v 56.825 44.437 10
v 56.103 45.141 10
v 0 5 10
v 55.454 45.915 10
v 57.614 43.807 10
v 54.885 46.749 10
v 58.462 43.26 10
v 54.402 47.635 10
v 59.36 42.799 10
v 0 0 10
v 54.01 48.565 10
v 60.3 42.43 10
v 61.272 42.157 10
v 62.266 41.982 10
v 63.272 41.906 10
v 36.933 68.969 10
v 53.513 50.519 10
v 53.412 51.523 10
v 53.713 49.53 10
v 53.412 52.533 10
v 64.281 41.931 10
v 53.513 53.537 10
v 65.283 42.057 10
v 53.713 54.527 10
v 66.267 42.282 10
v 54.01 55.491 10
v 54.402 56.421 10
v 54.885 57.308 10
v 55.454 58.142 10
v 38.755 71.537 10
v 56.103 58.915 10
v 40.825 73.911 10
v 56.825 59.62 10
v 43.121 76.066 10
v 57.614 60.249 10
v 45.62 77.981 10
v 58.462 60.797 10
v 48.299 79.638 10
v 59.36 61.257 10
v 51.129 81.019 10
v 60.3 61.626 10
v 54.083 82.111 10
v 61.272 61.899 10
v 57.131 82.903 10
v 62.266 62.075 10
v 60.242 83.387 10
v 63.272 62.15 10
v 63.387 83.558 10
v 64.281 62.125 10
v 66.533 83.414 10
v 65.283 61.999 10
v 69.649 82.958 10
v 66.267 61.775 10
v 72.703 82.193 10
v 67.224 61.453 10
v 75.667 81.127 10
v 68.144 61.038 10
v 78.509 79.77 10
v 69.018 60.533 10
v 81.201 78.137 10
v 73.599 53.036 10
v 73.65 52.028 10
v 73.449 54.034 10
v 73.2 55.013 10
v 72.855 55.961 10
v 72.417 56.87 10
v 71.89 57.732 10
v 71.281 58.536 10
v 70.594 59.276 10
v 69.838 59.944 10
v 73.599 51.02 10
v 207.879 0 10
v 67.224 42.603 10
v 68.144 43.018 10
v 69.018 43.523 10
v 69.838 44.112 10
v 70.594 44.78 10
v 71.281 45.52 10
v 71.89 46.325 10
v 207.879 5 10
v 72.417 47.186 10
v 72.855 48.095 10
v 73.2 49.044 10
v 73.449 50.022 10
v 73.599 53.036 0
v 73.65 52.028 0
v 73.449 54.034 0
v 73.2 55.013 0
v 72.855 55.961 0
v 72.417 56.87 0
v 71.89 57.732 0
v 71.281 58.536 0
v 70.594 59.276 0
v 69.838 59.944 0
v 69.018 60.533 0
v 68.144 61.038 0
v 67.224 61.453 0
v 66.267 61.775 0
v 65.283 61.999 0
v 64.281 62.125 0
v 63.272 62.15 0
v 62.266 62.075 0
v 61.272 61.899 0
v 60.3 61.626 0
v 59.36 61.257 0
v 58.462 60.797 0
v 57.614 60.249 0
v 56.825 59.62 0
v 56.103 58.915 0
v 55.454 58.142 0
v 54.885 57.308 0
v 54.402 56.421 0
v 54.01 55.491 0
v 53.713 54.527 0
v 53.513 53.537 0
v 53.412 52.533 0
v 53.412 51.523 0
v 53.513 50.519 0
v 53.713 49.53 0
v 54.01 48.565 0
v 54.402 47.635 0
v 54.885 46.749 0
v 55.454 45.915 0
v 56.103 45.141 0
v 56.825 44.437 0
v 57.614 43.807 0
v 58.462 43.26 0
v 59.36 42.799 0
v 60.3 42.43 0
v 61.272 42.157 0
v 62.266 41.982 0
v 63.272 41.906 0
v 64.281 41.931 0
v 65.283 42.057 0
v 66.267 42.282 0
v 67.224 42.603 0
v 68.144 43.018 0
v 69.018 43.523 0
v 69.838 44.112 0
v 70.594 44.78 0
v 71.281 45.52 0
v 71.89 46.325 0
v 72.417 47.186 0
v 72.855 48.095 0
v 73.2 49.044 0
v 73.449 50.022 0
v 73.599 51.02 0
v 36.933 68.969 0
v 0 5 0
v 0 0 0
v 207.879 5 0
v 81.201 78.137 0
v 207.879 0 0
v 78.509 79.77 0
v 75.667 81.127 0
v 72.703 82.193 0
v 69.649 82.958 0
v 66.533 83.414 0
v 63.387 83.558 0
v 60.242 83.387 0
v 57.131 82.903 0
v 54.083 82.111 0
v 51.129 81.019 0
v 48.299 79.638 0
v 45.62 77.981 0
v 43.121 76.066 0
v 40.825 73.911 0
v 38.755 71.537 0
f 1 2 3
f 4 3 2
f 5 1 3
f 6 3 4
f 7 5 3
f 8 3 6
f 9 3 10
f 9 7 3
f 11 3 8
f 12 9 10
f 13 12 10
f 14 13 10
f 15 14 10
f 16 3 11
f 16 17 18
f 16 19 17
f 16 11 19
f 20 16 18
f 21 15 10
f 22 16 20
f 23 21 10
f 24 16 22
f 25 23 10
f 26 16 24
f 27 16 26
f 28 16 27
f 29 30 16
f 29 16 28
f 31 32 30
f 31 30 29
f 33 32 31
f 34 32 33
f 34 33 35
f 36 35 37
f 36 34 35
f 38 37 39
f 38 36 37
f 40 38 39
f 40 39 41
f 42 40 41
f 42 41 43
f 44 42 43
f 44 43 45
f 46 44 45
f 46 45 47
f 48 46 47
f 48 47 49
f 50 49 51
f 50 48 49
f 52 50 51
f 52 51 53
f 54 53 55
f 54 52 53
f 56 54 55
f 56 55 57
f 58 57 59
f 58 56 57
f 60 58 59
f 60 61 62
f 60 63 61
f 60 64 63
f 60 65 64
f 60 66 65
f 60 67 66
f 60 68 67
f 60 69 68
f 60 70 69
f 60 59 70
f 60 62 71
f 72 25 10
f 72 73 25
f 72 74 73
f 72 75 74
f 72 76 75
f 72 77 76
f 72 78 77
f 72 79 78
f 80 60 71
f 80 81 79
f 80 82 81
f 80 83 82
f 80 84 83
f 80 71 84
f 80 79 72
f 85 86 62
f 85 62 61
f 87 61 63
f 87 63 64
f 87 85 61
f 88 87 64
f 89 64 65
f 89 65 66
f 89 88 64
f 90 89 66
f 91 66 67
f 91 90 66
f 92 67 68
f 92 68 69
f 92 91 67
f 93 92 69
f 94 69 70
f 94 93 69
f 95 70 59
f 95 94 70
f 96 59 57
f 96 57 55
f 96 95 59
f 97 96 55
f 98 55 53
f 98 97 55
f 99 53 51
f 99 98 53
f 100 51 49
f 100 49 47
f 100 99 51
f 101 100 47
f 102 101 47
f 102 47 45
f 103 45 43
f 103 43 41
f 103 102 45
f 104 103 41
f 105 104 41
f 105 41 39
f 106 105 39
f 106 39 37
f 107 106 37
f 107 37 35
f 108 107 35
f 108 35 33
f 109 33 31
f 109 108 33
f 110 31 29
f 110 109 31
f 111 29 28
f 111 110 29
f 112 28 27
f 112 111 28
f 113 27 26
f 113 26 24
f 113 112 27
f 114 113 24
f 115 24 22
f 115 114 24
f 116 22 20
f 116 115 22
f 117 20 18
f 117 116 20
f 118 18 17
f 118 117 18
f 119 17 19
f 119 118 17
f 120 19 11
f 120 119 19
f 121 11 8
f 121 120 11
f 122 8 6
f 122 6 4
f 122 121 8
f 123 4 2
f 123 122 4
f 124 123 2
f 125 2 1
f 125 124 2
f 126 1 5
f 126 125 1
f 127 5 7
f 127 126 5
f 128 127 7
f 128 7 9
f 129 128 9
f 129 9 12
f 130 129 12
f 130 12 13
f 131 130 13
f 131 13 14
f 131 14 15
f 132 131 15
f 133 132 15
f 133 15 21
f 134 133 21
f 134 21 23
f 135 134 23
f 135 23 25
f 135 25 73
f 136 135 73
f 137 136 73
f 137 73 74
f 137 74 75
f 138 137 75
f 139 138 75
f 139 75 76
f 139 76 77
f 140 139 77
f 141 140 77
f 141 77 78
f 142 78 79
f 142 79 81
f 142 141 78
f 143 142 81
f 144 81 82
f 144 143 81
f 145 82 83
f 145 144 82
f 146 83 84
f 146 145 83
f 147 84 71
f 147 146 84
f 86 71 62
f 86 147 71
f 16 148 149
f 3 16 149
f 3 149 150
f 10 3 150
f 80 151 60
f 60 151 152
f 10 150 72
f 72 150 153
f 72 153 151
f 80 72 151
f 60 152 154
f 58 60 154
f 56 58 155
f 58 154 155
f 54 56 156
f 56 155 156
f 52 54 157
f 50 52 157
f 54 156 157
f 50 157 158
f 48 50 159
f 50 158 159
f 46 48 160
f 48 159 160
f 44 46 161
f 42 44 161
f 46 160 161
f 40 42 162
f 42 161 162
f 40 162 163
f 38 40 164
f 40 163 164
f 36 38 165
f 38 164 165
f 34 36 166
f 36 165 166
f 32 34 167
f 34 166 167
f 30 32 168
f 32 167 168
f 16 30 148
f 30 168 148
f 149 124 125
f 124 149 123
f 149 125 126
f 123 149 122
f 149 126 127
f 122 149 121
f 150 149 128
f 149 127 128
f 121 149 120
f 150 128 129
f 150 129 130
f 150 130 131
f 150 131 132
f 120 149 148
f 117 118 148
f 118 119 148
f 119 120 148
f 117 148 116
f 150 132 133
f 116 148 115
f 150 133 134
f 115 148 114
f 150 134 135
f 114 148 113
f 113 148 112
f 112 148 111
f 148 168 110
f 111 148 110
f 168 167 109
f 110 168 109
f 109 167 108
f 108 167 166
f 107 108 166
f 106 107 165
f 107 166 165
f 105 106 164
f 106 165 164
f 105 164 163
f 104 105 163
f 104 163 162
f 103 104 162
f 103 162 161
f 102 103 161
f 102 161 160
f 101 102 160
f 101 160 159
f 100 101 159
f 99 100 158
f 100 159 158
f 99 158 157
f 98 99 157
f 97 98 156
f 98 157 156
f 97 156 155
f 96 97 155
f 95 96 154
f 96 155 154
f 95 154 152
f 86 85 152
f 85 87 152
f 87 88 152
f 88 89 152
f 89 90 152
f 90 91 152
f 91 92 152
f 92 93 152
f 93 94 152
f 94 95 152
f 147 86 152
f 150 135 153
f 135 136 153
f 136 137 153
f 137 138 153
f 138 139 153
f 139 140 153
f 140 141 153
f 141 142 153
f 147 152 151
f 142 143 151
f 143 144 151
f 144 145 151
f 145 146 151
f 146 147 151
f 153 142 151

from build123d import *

# Parameters (mm, degrees)
ESQUISSE1_R        = 10.125
BOSS_EXTRU_1_DEPTH = 10


with BuildPart() as part:
    # Esquisse1 → Boss.-Extru.1 (new body)
    with BuildSketch(Plane.XY):
        with BuildLine():
            Line((0, 0), (207.878588044, 0))
            Line((207.878588044, 0), (207.878588044, 5))
            Line((207.878588044, 5), (81.20130317, 78.137164522))
            ThreePointArc((81.20130317, 78.137164522), (57.130536246, 82.902959743), (36.932524958, 68.969009678))
            Line((36.932524958, 68.969009678), (0, 5))
            Line((0, 5), (0, 0))
        make_face()
        with Locations((63.524775179, 52.028138149)):
            Circle(ESQUISSE1_R, mode=Mode.SUBTRACT)
    extrude(amount=BOSS_EXTRU_1_DEPTH)


solid = part.part
